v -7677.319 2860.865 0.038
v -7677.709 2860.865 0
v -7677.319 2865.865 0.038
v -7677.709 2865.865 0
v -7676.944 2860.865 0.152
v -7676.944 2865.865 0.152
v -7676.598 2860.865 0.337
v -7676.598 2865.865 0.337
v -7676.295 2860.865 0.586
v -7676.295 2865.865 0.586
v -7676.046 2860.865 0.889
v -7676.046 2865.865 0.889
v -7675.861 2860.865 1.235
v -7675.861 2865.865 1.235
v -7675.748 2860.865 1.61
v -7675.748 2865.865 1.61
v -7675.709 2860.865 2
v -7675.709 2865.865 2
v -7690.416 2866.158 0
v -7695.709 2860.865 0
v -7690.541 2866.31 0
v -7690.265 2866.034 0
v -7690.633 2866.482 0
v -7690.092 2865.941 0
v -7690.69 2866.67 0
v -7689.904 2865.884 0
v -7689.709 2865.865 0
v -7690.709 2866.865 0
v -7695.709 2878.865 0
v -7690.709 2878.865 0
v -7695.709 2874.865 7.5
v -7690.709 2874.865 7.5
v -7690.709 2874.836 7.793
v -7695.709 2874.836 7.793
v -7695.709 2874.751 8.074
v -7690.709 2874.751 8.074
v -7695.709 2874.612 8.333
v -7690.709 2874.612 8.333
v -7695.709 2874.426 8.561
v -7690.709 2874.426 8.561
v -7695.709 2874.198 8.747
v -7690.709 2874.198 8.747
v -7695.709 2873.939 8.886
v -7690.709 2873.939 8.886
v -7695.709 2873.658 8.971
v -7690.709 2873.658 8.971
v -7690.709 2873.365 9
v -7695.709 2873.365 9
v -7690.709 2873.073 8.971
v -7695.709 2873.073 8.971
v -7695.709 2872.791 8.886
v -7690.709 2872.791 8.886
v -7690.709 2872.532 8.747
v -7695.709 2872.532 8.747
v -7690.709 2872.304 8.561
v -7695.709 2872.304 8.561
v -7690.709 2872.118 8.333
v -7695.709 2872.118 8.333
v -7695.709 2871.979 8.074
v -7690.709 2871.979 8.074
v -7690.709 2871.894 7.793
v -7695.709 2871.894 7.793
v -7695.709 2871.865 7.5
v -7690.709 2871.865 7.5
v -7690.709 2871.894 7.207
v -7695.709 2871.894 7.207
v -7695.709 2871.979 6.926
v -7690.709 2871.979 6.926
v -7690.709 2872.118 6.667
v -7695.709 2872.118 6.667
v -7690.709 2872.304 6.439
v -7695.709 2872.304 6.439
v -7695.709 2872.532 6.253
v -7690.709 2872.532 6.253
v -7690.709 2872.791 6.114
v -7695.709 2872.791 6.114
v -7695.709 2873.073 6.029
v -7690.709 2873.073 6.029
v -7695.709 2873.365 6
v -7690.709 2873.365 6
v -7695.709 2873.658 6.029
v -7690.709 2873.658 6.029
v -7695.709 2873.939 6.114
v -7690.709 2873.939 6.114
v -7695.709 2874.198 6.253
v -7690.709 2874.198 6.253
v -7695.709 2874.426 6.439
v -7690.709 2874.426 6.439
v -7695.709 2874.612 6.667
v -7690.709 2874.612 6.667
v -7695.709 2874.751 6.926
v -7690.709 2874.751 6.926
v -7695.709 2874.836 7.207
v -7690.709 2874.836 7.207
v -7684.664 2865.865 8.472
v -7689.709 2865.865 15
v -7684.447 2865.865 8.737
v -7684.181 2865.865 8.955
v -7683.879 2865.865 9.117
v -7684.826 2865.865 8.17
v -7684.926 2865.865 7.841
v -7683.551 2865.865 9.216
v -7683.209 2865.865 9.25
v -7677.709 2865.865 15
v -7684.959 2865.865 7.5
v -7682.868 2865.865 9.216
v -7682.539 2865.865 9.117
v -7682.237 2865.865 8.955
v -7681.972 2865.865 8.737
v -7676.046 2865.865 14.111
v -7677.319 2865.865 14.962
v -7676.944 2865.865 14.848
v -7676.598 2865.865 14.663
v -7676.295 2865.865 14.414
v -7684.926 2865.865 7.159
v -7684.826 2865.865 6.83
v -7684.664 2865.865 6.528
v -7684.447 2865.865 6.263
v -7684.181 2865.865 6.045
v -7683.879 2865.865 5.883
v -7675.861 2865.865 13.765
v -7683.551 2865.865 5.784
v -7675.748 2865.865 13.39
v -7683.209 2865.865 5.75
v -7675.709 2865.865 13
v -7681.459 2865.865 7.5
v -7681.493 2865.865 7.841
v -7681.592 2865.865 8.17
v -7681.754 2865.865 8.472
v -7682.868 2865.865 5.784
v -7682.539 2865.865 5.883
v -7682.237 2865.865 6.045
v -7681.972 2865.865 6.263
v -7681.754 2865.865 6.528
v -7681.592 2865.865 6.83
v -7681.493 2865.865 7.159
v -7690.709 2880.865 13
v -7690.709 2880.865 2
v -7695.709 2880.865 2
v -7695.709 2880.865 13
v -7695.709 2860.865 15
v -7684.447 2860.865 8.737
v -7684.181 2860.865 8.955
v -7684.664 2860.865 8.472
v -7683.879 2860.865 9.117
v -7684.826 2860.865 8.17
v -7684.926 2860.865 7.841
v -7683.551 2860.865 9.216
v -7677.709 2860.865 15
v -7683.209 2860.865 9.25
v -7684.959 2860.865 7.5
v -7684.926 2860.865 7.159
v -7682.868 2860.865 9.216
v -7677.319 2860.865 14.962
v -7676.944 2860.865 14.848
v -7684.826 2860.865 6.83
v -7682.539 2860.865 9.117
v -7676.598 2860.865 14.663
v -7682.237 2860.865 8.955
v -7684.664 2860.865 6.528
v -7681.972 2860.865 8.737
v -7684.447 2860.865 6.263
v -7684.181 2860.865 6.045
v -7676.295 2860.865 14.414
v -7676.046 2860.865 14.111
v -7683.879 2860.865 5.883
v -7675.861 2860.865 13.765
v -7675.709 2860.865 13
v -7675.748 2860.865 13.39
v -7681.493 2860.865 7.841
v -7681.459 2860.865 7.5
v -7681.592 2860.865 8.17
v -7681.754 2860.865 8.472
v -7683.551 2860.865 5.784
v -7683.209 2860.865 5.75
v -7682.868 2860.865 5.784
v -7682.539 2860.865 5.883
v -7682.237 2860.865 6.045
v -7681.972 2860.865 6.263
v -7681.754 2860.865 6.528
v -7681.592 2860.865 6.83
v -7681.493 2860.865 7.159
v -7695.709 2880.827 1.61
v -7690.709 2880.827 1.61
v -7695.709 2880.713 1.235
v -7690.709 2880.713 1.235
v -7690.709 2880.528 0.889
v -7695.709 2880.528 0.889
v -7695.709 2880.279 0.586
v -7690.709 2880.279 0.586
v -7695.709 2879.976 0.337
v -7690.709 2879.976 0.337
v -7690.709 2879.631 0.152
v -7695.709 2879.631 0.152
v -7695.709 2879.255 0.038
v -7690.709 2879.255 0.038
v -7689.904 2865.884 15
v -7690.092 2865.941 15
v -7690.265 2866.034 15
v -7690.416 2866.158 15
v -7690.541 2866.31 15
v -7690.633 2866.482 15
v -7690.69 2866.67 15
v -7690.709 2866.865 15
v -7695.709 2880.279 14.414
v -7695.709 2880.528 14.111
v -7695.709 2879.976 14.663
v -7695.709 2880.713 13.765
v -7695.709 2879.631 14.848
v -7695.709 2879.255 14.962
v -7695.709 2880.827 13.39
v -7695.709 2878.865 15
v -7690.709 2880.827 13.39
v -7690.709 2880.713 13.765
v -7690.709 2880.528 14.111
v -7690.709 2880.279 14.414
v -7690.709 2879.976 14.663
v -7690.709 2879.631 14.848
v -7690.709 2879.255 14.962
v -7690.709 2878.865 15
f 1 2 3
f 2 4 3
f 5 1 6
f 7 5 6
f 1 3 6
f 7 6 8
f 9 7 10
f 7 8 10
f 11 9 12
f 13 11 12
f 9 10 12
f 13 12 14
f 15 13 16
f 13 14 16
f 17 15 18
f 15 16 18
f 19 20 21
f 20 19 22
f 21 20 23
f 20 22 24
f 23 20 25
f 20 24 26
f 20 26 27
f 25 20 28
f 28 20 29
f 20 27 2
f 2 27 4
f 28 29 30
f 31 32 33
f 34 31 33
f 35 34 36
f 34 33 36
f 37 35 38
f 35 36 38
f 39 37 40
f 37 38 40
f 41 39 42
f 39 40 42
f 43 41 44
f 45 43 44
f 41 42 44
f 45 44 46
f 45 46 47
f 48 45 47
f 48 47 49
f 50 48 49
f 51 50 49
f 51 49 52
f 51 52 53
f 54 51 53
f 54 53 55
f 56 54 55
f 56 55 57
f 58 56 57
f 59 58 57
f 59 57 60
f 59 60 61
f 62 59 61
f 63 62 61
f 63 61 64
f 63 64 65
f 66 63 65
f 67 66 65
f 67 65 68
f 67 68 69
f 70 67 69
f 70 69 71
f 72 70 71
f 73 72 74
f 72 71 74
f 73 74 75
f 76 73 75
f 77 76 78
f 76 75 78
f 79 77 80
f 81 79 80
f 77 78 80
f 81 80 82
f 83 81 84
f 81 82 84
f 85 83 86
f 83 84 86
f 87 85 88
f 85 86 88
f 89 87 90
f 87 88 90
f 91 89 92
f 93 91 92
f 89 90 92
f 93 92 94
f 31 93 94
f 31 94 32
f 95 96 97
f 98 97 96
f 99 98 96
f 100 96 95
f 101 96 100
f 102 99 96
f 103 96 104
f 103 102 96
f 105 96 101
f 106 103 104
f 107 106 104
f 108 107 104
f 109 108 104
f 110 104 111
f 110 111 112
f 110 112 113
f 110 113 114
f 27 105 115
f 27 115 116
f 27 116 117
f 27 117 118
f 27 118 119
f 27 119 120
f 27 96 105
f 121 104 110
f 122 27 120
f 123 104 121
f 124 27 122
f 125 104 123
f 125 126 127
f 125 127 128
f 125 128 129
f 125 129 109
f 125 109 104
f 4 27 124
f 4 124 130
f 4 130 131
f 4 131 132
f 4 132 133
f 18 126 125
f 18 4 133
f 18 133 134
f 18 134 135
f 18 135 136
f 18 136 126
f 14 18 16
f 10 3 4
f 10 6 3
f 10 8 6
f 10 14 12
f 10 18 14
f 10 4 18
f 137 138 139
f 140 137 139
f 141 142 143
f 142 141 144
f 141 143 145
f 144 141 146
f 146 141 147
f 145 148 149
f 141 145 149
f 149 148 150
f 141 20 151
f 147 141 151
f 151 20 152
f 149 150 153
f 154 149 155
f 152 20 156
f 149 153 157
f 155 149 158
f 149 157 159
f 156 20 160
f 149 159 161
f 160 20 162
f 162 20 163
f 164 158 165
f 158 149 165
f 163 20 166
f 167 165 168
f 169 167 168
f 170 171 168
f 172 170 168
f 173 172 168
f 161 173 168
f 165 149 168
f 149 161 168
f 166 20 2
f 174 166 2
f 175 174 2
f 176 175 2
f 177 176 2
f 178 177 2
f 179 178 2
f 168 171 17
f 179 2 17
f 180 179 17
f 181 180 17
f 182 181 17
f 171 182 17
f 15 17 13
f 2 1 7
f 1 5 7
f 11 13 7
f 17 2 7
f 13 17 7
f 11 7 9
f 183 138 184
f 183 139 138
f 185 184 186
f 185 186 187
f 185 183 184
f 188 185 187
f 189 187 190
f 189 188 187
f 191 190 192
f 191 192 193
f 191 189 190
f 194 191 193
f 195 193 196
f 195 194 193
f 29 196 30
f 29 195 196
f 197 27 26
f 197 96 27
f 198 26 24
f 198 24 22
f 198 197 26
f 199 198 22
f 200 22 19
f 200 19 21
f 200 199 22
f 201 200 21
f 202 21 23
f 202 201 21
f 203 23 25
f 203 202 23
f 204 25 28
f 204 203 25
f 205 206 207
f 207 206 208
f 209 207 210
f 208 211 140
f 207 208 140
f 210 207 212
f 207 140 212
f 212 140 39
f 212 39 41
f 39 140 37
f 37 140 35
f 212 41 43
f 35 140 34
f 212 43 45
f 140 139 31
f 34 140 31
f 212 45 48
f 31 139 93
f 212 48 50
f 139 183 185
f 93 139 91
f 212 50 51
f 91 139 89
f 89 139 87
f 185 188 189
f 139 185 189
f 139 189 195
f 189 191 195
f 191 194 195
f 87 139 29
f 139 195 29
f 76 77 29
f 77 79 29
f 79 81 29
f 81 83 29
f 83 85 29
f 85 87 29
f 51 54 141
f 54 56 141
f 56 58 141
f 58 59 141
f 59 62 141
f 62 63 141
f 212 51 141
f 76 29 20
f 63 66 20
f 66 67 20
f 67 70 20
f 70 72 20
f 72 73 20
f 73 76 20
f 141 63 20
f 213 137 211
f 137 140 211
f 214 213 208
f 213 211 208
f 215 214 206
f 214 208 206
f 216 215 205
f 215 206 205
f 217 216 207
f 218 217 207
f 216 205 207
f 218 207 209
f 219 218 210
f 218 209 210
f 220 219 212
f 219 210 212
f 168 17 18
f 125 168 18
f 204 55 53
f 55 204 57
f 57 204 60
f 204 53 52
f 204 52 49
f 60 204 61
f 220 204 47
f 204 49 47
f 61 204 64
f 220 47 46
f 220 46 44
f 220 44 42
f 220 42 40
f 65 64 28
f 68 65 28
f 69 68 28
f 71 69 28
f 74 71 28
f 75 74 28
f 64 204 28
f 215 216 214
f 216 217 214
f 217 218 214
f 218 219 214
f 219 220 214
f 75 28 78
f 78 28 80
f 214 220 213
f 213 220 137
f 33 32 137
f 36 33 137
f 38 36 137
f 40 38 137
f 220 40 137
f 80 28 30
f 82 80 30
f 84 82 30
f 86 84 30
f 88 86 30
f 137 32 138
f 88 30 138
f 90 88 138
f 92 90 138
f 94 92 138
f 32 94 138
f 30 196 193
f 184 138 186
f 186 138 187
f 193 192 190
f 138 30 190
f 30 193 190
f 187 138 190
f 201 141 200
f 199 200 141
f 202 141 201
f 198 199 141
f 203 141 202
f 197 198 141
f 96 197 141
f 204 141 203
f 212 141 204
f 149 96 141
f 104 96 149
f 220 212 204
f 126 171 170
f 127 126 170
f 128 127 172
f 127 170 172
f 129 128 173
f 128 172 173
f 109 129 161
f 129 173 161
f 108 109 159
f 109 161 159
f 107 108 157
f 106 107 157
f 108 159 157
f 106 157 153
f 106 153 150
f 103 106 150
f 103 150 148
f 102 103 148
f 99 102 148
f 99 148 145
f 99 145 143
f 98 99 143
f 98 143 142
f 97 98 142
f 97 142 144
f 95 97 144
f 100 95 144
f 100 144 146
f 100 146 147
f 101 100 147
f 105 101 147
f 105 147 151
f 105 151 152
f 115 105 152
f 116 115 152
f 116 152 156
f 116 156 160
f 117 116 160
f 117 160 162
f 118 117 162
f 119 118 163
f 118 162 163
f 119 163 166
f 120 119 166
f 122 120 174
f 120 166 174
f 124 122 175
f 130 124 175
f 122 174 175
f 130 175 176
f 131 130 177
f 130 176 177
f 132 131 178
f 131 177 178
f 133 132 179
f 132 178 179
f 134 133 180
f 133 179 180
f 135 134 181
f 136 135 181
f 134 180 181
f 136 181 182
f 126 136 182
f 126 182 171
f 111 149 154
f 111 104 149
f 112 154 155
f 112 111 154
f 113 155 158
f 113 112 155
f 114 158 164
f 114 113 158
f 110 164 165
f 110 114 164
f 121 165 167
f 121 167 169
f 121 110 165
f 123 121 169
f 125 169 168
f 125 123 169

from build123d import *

# Parameters (mm, degrees)
F0_W     = 15
F0_H     = 5
F1_DEPTH = 15
F3_R     = 1.5
F4_DEPTH = 127
F5_D     = 3.5
F6_R     = 2
F7_R     = 2
F8_R     = 1


with BuildPart() as f1:
    # F0 (on Top) → F1 (new body)
    with BuildSketch(Plane.XY):
        Polygon((-7695.709171, 2880.865144), (-7695.709171, 2860.865144), (-7690.709171, 2860.865144), (-7690.709171, 2865.865144), (-7690.709171, 2880.865144), align=None)
        with Locations((-7683.209171, 2863.365144)):
            Rectangle(F0_W, F0_H)
    extrude(amount=F1_DEPTH)

    # F3 (on face) → F4 (cut)
    with BuildSketch(Plane.YZ.offset(-7690.709171)):
        with Locations((2873.365144, 7.5)):
            Circle(F3_R)
    extrude(amount=-F4_DEPTH, mode=Mode.SUBTRACT)

    # F5 (through all)
    with Locations(Plane(origin=(0, 2865.865144, 0), x_dir=(-1, 0, 0), z_dir=(0, 1, 0))):
        with Locations((7683.209171, 7.5)):
            Hole(F5_D / 2)

    # F6
    f6_edges = [f1.edges().sort_by_distance(p)[0] for p in [
        (-7693.209171, 2880.865144, 15),
        (-7693.209171, 2880.865144, 0),
    ]]
    fillet(f6_edges, radius=F6_R)

    # F7
    f7_edges = [f1.edges().sort_by_distance(p)[0] for p in [
        (-7675.709171, 2863.365144, 15),
        (-7675.709171, 2863.365144, 0),
    ]]
    fillet(f7_edges, radius=F7_R)

    # F8
    f8_edges = [f1.edges().sort_by_distance(p)[0] for p in [
        (-7690.709171, 2865.865144, 7.5),
    ]]
    fillet(f8_edges, radius=F8_R)


solid = f1.part
